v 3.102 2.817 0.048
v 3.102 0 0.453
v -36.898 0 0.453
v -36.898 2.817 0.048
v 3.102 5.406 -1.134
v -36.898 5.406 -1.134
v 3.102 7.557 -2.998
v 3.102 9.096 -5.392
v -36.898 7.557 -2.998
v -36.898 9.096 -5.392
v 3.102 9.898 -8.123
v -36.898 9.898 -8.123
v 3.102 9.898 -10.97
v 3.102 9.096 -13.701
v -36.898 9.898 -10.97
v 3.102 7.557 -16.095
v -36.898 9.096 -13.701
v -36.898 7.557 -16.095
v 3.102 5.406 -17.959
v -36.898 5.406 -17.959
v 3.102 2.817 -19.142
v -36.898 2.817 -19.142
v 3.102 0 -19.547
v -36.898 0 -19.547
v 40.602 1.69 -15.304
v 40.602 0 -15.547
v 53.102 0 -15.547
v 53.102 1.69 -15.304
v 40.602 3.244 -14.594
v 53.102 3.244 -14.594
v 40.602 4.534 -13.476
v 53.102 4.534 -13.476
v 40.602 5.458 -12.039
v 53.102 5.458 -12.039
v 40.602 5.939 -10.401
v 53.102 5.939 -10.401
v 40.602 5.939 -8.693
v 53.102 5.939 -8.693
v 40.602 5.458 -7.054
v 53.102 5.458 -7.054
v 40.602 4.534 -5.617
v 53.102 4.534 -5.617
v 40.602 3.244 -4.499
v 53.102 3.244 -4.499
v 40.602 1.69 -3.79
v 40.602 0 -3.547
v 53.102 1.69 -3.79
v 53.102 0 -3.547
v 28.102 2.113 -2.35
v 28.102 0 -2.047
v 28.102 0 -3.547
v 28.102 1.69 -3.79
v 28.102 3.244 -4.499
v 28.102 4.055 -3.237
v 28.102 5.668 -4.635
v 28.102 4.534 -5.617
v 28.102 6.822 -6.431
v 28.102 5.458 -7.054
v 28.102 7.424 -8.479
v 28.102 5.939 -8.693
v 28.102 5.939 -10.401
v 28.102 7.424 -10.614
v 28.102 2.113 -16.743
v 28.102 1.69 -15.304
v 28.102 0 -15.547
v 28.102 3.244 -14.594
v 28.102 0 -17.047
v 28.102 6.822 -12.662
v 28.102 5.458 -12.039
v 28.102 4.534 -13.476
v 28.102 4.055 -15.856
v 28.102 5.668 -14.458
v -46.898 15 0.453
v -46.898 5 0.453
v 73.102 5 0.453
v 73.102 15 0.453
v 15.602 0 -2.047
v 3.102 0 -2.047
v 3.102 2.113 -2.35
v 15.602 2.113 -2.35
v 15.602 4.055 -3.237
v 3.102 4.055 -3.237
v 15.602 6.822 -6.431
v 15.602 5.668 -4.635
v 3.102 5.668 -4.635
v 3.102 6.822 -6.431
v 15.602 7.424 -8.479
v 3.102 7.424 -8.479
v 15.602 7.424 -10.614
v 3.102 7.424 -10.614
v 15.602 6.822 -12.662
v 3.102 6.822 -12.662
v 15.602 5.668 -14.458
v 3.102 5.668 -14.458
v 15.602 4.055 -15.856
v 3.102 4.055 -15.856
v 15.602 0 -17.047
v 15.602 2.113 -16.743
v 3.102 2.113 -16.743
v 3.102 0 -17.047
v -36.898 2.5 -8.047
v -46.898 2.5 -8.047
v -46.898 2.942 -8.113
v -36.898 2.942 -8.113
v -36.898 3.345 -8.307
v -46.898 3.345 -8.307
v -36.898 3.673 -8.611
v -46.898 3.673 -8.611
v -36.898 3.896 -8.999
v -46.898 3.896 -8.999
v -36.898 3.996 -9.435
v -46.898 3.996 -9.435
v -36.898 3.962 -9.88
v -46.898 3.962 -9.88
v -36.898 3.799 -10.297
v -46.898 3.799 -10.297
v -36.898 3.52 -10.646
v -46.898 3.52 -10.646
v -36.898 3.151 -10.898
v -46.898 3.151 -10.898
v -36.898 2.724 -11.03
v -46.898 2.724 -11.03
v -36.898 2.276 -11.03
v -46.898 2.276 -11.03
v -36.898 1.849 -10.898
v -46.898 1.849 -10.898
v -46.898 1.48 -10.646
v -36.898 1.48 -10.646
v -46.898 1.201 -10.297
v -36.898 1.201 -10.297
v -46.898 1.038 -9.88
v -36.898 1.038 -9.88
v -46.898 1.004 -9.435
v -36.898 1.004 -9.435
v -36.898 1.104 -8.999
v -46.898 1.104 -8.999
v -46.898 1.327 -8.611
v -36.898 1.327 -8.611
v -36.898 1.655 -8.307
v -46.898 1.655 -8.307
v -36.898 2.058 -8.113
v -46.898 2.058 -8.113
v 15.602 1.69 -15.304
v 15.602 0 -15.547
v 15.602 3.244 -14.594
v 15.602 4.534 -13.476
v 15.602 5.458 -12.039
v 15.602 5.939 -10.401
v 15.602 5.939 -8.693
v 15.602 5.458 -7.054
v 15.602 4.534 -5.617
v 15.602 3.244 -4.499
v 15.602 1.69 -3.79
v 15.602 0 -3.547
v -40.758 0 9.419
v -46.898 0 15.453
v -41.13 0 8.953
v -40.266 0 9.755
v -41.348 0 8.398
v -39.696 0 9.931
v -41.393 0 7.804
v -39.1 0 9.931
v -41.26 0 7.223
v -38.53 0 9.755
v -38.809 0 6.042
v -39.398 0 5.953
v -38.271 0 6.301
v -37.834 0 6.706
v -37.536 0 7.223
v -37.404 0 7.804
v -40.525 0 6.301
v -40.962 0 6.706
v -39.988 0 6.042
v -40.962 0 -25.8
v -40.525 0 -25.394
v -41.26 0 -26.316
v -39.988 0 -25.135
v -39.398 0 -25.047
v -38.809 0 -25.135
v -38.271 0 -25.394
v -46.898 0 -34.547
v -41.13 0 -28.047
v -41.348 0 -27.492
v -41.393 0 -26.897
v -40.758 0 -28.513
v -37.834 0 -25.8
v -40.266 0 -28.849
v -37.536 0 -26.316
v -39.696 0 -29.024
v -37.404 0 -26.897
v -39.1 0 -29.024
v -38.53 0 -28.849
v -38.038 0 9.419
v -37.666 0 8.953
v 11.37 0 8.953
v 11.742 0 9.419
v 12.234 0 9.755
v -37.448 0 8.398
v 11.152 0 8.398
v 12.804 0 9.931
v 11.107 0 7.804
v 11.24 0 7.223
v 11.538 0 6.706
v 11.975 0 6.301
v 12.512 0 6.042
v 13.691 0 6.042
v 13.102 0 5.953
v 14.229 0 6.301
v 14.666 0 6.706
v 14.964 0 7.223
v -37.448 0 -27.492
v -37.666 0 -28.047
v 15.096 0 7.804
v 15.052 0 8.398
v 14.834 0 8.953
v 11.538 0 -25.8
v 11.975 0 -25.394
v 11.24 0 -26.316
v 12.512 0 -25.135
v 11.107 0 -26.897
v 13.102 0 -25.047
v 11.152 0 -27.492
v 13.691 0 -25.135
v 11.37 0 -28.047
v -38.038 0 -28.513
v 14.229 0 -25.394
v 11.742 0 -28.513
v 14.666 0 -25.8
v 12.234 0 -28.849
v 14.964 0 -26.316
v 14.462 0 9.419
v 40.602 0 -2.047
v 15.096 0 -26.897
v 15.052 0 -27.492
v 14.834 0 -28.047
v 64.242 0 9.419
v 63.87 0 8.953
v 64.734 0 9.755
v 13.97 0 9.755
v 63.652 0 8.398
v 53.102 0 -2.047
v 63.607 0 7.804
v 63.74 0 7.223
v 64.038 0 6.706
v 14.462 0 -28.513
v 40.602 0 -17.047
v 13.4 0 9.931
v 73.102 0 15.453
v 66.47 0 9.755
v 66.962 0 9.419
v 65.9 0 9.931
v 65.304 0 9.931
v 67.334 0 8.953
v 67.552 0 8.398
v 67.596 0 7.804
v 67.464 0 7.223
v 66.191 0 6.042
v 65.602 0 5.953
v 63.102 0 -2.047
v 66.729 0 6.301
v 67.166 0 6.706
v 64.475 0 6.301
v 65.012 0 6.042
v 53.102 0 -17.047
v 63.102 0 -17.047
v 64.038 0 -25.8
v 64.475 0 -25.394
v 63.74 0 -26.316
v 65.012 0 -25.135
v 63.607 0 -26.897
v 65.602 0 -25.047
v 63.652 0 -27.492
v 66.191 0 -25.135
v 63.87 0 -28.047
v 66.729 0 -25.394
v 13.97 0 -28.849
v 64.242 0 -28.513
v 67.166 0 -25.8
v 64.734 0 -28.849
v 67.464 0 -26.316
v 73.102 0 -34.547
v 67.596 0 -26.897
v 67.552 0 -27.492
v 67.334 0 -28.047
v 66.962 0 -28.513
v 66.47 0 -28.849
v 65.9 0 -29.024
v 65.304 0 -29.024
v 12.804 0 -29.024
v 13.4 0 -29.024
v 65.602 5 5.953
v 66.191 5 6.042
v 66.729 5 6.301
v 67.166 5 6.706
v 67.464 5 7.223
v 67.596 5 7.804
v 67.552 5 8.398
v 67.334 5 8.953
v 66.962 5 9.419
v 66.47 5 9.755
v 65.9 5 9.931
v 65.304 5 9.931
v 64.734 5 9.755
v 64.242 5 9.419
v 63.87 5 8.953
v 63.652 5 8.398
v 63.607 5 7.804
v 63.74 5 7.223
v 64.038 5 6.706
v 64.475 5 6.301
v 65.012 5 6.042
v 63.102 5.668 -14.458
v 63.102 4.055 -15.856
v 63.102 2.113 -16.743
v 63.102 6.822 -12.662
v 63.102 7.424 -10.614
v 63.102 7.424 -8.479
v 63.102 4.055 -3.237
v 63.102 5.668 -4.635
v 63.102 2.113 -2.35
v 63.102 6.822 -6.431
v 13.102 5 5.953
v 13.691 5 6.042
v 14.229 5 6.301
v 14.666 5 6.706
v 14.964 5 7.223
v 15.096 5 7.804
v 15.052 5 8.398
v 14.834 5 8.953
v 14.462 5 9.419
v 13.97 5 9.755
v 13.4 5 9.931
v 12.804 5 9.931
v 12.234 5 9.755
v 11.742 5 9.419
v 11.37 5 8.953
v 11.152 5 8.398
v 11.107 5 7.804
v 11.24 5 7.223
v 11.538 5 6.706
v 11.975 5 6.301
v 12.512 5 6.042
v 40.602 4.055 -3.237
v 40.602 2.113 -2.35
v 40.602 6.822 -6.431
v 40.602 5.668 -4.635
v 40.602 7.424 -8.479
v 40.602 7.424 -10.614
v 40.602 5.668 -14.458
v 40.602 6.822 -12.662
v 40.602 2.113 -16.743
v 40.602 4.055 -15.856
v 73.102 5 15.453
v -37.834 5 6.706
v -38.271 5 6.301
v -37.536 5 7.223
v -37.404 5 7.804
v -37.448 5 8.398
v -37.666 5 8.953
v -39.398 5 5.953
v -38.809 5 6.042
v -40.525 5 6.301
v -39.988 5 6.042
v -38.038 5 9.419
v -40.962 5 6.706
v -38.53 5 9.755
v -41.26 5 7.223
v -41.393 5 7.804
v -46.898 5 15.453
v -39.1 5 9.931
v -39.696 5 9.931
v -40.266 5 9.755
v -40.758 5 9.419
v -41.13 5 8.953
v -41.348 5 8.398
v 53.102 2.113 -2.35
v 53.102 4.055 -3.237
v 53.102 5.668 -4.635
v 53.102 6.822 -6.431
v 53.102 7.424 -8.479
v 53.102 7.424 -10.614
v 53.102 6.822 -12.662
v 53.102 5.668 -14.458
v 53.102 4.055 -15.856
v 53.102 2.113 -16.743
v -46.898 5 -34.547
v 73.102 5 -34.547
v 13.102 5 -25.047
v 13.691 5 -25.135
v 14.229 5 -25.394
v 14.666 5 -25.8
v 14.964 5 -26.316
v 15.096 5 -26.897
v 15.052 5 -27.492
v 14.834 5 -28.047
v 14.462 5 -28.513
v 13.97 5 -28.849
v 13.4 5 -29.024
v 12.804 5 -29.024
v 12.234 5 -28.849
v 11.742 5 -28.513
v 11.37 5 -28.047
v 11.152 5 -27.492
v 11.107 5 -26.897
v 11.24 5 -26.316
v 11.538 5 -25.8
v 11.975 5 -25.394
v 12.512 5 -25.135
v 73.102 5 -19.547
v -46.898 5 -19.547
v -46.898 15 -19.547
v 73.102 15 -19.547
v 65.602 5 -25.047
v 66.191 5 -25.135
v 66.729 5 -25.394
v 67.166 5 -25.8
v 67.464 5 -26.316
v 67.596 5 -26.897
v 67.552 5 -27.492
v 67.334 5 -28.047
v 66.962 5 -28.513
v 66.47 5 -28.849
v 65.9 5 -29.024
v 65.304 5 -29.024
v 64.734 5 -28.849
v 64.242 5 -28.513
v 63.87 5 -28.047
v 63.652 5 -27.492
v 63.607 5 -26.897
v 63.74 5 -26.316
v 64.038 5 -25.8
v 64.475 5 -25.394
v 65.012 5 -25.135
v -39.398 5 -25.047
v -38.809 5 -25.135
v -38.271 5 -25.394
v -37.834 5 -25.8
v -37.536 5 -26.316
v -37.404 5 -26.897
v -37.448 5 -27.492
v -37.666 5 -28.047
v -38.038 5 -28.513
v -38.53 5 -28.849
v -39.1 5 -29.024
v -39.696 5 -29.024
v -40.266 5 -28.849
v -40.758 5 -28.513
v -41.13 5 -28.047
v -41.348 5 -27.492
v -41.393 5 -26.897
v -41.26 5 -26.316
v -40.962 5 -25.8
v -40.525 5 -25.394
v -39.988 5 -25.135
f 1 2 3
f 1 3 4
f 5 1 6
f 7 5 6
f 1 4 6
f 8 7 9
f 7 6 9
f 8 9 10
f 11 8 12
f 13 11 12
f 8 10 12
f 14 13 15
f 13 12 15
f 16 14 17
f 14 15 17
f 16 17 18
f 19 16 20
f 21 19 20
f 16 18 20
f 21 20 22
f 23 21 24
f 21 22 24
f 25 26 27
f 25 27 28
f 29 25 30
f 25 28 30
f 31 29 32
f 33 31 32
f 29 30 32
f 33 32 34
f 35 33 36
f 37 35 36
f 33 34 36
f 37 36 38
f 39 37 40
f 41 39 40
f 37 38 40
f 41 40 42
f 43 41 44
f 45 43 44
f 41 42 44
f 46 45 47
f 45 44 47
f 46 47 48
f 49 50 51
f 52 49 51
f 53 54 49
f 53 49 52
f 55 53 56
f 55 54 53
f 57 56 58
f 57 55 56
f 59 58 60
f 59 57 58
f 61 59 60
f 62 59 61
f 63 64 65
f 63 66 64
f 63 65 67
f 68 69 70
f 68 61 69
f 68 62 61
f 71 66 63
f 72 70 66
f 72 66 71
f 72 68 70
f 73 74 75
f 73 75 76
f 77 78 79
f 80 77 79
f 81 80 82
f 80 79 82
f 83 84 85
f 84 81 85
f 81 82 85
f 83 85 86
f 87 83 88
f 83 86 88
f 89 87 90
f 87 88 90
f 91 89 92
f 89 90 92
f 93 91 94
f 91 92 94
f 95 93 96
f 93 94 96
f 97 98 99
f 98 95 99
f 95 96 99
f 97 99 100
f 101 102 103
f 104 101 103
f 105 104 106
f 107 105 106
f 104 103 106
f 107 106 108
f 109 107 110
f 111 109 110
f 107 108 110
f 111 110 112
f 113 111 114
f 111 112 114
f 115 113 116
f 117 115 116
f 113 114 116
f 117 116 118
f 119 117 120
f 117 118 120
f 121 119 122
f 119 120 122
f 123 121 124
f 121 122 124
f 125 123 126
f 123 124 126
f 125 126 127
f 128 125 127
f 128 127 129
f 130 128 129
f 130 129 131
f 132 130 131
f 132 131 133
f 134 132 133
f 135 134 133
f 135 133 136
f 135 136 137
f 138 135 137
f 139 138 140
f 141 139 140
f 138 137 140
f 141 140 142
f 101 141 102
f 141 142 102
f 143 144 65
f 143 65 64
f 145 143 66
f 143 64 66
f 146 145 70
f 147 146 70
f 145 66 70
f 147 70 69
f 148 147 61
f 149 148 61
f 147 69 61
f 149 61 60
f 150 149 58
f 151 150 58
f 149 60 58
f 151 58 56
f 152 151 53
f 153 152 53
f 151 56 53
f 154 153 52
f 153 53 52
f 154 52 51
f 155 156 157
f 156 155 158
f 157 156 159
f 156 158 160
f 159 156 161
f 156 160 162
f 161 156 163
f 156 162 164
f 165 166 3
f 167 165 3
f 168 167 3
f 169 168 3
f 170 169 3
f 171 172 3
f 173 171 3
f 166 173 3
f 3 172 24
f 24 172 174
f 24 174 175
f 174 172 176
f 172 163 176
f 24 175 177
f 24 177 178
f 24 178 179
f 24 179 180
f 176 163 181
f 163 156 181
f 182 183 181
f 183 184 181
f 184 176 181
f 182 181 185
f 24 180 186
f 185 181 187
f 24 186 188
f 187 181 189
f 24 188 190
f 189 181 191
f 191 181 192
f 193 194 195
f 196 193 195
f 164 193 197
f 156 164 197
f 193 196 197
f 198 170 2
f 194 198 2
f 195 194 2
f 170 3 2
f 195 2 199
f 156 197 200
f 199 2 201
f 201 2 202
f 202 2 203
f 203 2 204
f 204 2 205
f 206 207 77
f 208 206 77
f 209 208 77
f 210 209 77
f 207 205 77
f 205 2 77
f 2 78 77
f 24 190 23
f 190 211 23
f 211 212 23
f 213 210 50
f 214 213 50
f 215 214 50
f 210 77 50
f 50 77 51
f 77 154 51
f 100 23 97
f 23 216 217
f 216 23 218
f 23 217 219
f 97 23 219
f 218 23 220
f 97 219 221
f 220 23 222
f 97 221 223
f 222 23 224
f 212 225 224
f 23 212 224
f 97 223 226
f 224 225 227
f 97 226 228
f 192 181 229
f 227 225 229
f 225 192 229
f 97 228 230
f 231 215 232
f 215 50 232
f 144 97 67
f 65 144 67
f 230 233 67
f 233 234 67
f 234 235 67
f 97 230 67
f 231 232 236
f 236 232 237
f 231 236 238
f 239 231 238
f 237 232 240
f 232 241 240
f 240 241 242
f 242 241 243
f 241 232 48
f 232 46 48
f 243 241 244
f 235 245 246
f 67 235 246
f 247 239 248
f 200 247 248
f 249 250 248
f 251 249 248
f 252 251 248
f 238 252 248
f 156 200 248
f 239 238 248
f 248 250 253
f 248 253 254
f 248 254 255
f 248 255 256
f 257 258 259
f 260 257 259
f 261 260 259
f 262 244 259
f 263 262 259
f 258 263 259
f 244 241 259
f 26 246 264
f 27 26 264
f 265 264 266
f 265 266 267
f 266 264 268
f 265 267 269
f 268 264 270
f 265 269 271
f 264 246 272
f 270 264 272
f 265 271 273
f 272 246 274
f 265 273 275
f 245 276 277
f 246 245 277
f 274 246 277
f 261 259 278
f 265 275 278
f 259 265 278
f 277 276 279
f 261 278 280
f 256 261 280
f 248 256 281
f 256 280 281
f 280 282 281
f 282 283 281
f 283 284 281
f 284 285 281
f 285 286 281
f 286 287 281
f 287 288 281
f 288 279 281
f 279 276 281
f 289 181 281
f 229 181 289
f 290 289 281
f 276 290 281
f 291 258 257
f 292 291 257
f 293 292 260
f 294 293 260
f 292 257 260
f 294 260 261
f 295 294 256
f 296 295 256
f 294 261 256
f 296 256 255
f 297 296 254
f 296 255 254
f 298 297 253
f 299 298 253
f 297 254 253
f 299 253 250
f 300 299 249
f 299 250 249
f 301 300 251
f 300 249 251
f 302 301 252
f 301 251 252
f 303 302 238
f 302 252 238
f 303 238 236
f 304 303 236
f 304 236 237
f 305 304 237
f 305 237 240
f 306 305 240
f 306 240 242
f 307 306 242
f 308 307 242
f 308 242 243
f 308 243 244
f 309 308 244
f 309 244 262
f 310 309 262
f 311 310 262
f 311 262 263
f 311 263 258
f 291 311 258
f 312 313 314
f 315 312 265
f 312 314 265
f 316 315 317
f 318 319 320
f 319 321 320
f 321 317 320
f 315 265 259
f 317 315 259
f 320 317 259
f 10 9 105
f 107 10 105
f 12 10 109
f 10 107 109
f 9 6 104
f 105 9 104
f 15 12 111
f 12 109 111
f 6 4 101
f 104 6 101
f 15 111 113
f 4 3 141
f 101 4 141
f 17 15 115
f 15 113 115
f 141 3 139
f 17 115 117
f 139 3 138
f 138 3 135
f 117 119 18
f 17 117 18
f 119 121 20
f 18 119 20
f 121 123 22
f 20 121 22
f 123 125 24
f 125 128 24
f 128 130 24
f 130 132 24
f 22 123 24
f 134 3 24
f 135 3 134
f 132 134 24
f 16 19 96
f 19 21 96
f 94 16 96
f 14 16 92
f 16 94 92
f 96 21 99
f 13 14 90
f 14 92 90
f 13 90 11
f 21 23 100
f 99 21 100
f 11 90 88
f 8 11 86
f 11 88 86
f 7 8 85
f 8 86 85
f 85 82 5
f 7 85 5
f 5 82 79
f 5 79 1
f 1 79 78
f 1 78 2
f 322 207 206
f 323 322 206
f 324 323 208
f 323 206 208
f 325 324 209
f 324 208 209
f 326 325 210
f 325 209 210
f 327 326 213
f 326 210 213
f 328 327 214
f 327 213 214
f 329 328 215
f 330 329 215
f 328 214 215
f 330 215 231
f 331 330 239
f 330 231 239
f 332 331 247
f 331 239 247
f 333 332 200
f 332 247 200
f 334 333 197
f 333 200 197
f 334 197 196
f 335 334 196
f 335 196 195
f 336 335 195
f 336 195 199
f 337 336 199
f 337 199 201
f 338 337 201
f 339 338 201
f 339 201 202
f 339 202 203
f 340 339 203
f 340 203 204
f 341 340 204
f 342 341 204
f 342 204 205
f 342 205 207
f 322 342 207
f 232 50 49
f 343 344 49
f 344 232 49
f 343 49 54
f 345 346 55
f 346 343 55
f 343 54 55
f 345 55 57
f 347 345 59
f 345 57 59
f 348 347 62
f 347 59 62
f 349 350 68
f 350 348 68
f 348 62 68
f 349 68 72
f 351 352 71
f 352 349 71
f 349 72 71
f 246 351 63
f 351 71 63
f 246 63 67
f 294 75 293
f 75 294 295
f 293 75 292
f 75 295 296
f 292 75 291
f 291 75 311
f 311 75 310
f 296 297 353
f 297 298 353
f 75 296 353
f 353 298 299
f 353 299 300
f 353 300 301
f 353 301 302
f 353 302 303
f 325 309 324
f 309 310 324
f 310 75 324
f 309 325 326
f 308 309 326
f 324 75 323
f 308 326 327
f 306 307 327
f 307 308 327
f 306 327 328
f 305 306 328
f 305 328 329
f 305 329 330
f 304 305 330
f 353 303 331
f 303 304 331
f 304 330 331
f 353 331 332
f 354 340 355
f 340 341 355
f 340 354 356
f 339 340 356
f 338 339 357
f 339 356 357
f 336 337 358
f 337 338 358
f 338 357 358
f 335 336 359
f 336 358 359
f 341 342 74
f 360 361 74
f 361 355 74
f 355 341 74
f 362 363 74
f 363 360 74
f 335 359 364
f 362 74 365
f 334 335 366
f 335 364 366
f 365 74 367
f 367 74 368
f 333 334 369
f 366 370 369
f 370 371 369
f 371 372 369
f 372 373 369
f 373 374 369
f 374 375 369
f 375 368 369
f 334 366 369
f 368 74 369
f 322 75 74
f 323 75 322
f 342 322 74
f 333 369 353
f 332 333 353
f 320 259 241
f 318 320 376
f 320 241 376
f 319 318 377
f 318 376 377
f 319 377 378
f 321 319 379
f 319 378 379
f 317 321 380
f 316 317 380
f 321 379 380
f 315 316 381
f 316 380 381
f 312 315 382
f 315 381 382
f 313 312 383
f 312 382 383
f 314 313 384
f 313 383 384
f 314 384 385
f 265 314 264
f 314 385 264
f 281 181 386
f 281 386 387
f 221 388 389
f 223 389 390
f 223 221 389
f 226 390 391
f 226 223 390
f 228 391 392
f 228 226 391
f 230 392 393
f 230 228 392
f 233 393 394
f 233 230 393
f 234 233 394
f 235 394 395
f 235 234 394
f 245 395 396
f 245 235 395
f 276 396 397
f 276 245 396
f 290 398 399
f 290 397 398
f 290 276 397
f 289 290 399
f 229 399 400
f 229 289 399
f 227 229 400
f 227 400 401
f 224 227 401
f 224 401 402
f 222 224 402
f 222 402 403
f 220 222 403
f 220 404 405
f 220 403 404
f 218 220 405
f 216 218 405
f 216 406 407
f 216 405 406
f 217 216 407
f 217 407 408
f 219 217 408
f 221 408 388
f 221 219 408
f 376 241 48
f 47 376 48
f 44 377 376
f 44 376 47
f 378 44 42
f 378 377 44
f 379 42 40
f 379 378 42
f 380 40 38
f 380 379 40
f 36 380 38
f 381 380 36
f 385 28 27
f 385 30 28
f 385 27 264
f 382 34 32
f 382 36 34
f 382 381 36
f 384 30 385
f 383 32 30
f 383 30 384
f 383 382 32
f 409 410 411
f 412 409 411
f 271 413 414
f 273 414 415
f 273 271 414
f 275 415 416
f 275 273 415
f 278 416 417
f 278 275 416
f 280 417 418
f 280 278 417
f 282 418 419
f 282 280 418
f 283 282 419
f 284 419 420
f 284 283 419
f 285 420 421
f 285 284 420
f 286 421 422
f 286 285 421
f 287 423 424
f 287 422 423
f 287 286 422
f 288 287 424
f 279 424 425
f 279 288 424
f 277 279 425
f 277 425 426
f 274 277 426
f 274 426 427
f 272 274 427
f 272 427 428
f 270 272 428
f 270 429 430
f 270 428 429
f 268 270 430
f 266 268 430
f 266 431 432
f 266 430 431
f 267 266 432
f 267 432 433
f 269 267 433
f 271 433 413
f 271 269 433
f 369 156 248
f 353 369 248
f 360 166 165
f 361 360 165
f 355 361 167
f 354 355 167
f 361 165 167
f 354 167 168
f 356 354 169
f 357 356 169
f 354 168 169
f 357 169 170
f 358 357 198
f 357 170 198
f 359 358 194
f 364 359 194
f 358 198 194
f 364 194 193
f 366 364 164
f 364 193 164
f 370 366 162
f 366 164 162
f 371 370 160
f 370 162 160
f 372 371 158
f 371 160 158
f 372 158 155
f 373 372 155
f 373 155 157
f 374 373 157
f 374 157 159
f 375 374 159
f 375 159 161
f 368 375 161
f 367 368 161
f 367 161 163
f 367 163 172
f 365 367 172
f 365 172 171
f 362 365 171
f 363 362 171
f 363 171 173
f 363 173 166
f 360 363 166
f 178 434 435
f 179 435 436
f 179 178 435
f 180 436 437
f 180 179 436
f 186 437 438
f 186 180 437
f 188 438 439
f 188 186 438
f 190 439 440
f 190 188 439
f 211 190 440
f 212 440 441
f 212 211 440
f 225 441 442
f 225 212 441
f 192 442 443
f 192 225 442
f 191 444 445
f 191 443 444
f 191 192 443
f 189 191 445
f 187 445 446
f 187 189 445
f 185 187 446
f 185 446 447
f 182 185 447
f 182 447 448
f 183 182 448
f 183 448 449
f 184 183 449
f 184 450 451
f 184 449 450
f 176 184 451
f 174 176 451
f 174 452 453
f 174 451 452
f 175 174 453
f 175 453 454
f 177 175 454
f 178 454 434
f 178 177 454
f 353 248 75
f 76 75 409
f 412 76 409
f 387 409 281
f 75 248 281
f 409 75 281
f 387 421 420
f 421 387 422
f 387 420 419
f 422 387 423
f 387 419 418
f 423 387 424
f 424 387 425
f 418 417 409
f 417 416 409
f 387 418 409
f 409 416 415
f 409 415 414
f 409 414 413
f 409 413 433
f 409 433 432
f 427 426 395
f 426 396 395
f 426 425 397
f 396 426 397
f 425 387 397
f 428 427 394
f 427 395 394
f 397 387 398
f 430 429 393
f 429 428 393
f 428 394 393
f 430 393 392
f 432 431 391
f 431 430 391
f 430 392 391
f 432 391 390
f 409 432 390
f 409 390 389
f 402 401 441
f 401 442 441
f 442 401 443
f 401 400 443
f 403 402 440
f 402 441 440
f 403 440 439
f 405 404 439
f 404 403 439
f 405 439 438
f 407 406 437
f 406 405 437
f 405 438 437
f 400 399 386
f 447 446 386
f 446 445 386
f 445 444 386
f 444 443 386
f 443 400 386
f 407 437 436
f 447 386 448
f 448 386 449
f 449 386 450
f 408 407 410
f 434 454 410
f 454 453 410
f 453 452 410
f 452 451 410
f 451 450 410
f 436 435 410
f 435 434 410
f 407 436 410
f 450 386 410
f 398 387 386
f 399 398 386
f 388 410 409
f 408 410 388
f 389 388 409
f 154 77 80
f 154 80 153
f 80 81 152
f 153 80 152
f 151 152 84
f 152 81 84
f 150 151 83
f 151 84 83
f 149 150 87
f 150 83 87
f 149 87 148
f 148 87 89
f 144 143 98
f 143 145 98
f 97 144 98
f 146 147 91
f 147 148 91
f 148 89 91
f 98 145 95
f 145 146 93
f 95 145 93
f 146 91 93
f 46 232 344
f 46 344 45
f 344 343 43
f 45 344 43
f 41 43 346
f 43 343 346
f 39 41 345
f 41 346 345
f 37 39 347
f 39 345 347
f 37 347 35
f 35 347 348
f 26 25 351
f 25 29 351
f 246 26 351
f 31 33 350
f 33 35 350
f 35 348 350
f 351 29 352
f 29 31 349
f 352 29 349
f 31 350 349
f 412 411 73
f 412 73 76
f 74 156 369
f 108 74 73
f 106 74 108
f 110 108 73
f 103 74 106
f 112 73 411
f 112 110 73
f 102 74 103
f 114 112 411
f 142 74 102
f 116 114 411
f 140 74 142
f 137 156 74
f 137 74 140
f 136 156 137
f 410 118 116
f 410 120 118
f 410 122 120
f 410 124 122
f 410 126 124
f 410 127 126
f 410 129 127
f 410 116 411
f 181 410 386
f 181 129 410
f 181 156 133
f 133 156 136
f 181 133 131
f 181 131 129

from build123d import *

# Parameters (mm, degrees)
SKETCH2_W                       = 120
SKETCH2_H                       = 50
BOSS_EXTRUDE1_DEPTH             = 15
SKIZZE7_R                       = 1.5
SCHNITT_LINEAR_AUSTRAGEN6_DEPTH = 10
SKIZZE10_W                      = 12.5
SKIZZE10_H                      = 1.5
ROTATION3_ANGLE                 = 180
SKIZZE11_W                      = 12.5
SKIZZE11_H                      = 1.5
ROTATION4_ANGLE                 = 180
SKIZZE12_R                      = 2
SCHNITT_LINEAR_AUSTRAGEN7_DEPTH = 83.233536557
SKIZZE13_W                      = 15
SKIZZE13_H                      = 10
SCHNITT_LINEAR_AUSTRAGEN8_DEPTH = 126.771499808


with BuildPart() as part:
    # Sketch2 → Boss-Extrude1 (new body)
    with BuildSketch(Plane(origin=(0, 0, 0), x_dir=(1, 0, 0), z_dir=(0, 1, 0))):
        with Locations((13.101876656, 9.54663752)):
            Rectangle(SKETCH2_W, SKETCH2_H)
    extrude(amount=BOSS_EXTRUDE1_DEPTH)

    # Skizze7 → Schnitt-Linear austragen6 (cut)
    with BuildSketch(Plane.ZY.offset(46.898123344)):
        with Locations((-9.54663752, 2.5)):
            Circle(SKIZZE7_R)
    extrude(amount=-SCHNITT_LINEAR_AUSTRAGEN6_DEPTH, mode=Mode.SUBTRACT)

    # Sketch3 → Schnitt-Rotation1 (revolve, cut)
    with BuildSketch(Plane(origin=(0, 0, 0), x_dir=(1, 0, 0), z_dir=(0, 1, 0))):
        Polygon((63.101876656, 9.54663752), (63.101876656, 17.04663752), (3.101876656, 17.04663752), (3.101876656, 19.54663752), (-36.898123344, 19.54663752), (-36.898123344, 9.54663752), align=None)
    revolve(axis=Axis((74.354835368, 0, -9.54663752), (-1, 0, 0)), mode=Mode.SUBTRACT)

    # Skizze10 → Rotation3 (revolve)
    with BuildSketch(Plane.XZ):
        with Locations((46.851876656, -16.29663752)):
            Rectangle(SKIZZE10_W, SKIZZE10_H)
    revolve(axis=Axis((85.744816074, 0, -9.54663752), (1, 0, 0)), revolution_arc=ROTATION3_ANGLE)

    # Skizze11 → Rotation4 (revolve)
    with BuildSketch(Plane.XZ):
        with Locations((21.851876656, -16.29663752)):
            Rectangle(SKIZZE11_W, SKIZZE11_H)
    revolve(axis=Axis((95.037830494, 0, -9.54663752), (1, 0, 0)), revolution_arc=ROTATION4_ANGLE)

    # Skizze12 → Schnitt-Linear austragen7 (cut, through all)
    with BuildSketch(Plane.XZ):
        with Locations(Location((-39.398123344, 7.95336248, 0), (0, 0, 270))):
            Circle(SKIZZE12_R)
        with Locations(Location((13.101876656, 7.95336248, 0), (0, 0, 270))):
            Circle(SKIZZE12_R)
        with Locations(Location((65.601876656, 7.95336248, 0), (0, 0, 270))):
            Circle(SKIZZE12_R)
    schnitt_linear_austragen7 = extrude(amount=-SCHNITT_LINEAR_AUSTRAGEN7_DEPTH, mode=Mode.SUBTRACT)

    # Spiegeln1: Schnitt-Linear austragen7 across plane
    add(schnitt_linear_austragen7.mirror(Plane.XY.offset(-9.54663752)), mode=Mode.SUBTRACT)

    # Skizze13 → Schnitt-Linear austragen8 (cut, through all)
    with BuildSketch(Plane.ZY.offset(46.898123344)):
        with Locations((7.95336248, 10)):
            Rectangle(SKIZZE13_W, SKIZZE13_H)
        with Locations((-27.04663752, 10)):
            Rectangle(SKIZZE13_W, SKIZZE13_H)
    extrude(amount=-SCHNITT_LINEAR_AUSTRAGEN8_DEPTH, mode=Mode.SUBTRACT)


solid = part.part
